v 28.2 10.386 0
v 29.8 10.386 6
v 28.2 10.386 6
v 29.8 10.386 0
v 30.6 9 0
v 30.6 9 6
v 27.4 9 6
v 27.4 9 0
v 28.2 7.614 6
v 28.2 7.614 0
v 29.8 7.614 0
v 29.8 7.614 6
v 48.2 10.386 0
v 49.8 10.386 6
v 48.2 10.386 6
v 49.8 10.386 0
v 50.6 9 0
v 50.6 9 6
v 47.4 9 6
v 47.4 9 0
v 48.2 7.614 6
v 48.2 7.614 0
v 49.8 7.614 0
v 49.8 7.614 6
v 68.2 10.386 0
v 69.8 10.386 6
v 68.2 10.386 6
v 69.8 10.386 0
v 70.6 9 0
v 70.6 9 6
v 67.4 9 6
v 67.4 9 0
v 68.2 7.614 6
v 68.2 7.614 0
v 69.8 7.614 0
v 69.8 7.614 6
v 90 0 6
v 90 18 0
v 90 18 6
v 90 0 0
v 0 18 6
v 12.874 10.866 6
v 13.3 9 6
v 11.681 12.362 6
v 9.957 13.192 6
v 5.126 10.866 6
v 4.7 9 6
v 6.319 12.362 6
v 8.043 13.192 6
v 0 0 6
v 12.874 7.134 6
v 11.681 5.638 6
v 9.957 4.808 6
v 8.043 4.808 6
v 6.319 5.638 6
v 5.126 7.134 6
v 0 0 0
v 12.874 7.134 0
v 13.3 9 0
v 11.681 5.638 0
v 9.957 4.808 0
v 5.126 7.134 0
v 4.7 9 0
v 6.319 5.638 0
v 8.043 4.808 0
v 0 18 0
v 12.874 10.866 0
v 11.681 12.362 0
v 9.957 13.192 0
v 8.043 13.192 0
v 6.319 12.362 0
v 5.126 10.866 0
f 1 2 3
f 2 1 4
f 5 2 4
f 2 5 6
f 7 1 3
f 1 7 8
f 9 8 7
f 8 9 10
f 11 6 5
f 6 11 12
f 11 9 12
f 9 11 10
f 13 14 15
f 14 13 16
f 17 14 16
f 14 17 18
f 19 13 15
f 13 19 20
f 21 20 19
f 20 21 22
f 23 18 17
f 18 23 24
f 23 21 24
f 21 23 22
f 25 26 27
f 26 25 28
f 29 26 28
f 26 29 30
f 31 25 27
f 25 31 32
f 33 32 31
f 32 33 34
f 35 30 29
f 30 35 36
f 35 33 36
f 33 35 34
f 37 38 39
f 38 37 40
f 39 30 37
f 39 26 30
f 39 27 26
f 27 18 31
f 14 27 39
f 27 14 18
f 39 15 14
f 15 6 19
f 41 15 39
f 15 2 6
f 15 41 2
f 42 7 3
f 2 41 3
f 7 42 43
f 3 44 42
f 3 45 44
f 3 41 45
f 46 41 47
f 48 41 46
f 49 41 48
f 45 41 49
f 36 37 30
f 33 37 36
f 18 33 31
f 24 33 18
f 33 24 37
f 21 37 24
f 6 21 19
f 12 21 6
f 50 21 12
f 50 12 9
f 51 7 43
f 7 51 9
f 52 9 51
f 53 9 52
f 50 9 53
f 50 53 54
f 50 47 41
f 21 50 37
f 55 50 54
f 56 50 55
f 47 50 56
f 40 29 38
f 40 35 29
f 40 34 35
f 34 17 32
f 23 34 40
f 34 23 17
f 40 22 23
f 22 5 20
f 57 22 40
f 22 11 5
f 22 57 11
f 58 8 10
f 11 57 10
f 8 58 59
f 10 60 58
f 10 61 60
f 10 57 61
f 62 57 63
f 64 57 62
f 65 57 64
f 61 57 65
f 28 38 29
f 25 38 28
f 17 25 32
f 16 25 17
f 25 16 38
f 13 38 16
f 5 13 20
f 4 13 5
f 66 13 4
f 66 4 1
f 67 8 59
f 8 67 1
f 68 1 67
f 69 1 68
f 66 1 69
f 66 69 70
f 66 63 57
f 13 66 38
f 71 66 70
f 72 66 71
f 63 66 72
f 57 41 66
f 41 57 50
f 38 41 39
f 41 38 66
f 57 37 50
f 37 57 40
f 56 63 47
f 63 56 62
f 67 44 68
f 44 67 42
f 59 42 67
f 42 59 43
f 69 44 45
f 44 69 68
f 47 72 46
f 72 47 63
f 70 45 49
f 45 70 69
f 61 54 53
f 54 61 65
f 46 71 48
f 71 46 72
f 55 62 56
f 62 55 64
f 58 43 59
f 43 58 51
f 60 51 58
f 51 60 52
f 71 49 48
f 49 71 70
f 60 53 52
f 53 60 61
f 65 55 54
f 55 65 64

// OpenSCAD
module rj_arm() {
  len = 90.0; w = 18.0; t = 6.0;
  shaft_hole_d = 8.6;
  hole_d = 3.2; pitch = 20.0; n = 3;
  difference() {
    cube([len, w, t], center=false);
    translate([w/2, w/2, -1]) cylinder(h=t+2, d=shaft_hole_d, center=false);
    for (i=[0:n-1]) {
      x = w/2 + (i+1)*pitch;
      if (x < len - w/2) translate([x, w/2, -1]) cylinder(h=t+2, d=hole_d, center=false);
    }
  }
}
rj_arm();
